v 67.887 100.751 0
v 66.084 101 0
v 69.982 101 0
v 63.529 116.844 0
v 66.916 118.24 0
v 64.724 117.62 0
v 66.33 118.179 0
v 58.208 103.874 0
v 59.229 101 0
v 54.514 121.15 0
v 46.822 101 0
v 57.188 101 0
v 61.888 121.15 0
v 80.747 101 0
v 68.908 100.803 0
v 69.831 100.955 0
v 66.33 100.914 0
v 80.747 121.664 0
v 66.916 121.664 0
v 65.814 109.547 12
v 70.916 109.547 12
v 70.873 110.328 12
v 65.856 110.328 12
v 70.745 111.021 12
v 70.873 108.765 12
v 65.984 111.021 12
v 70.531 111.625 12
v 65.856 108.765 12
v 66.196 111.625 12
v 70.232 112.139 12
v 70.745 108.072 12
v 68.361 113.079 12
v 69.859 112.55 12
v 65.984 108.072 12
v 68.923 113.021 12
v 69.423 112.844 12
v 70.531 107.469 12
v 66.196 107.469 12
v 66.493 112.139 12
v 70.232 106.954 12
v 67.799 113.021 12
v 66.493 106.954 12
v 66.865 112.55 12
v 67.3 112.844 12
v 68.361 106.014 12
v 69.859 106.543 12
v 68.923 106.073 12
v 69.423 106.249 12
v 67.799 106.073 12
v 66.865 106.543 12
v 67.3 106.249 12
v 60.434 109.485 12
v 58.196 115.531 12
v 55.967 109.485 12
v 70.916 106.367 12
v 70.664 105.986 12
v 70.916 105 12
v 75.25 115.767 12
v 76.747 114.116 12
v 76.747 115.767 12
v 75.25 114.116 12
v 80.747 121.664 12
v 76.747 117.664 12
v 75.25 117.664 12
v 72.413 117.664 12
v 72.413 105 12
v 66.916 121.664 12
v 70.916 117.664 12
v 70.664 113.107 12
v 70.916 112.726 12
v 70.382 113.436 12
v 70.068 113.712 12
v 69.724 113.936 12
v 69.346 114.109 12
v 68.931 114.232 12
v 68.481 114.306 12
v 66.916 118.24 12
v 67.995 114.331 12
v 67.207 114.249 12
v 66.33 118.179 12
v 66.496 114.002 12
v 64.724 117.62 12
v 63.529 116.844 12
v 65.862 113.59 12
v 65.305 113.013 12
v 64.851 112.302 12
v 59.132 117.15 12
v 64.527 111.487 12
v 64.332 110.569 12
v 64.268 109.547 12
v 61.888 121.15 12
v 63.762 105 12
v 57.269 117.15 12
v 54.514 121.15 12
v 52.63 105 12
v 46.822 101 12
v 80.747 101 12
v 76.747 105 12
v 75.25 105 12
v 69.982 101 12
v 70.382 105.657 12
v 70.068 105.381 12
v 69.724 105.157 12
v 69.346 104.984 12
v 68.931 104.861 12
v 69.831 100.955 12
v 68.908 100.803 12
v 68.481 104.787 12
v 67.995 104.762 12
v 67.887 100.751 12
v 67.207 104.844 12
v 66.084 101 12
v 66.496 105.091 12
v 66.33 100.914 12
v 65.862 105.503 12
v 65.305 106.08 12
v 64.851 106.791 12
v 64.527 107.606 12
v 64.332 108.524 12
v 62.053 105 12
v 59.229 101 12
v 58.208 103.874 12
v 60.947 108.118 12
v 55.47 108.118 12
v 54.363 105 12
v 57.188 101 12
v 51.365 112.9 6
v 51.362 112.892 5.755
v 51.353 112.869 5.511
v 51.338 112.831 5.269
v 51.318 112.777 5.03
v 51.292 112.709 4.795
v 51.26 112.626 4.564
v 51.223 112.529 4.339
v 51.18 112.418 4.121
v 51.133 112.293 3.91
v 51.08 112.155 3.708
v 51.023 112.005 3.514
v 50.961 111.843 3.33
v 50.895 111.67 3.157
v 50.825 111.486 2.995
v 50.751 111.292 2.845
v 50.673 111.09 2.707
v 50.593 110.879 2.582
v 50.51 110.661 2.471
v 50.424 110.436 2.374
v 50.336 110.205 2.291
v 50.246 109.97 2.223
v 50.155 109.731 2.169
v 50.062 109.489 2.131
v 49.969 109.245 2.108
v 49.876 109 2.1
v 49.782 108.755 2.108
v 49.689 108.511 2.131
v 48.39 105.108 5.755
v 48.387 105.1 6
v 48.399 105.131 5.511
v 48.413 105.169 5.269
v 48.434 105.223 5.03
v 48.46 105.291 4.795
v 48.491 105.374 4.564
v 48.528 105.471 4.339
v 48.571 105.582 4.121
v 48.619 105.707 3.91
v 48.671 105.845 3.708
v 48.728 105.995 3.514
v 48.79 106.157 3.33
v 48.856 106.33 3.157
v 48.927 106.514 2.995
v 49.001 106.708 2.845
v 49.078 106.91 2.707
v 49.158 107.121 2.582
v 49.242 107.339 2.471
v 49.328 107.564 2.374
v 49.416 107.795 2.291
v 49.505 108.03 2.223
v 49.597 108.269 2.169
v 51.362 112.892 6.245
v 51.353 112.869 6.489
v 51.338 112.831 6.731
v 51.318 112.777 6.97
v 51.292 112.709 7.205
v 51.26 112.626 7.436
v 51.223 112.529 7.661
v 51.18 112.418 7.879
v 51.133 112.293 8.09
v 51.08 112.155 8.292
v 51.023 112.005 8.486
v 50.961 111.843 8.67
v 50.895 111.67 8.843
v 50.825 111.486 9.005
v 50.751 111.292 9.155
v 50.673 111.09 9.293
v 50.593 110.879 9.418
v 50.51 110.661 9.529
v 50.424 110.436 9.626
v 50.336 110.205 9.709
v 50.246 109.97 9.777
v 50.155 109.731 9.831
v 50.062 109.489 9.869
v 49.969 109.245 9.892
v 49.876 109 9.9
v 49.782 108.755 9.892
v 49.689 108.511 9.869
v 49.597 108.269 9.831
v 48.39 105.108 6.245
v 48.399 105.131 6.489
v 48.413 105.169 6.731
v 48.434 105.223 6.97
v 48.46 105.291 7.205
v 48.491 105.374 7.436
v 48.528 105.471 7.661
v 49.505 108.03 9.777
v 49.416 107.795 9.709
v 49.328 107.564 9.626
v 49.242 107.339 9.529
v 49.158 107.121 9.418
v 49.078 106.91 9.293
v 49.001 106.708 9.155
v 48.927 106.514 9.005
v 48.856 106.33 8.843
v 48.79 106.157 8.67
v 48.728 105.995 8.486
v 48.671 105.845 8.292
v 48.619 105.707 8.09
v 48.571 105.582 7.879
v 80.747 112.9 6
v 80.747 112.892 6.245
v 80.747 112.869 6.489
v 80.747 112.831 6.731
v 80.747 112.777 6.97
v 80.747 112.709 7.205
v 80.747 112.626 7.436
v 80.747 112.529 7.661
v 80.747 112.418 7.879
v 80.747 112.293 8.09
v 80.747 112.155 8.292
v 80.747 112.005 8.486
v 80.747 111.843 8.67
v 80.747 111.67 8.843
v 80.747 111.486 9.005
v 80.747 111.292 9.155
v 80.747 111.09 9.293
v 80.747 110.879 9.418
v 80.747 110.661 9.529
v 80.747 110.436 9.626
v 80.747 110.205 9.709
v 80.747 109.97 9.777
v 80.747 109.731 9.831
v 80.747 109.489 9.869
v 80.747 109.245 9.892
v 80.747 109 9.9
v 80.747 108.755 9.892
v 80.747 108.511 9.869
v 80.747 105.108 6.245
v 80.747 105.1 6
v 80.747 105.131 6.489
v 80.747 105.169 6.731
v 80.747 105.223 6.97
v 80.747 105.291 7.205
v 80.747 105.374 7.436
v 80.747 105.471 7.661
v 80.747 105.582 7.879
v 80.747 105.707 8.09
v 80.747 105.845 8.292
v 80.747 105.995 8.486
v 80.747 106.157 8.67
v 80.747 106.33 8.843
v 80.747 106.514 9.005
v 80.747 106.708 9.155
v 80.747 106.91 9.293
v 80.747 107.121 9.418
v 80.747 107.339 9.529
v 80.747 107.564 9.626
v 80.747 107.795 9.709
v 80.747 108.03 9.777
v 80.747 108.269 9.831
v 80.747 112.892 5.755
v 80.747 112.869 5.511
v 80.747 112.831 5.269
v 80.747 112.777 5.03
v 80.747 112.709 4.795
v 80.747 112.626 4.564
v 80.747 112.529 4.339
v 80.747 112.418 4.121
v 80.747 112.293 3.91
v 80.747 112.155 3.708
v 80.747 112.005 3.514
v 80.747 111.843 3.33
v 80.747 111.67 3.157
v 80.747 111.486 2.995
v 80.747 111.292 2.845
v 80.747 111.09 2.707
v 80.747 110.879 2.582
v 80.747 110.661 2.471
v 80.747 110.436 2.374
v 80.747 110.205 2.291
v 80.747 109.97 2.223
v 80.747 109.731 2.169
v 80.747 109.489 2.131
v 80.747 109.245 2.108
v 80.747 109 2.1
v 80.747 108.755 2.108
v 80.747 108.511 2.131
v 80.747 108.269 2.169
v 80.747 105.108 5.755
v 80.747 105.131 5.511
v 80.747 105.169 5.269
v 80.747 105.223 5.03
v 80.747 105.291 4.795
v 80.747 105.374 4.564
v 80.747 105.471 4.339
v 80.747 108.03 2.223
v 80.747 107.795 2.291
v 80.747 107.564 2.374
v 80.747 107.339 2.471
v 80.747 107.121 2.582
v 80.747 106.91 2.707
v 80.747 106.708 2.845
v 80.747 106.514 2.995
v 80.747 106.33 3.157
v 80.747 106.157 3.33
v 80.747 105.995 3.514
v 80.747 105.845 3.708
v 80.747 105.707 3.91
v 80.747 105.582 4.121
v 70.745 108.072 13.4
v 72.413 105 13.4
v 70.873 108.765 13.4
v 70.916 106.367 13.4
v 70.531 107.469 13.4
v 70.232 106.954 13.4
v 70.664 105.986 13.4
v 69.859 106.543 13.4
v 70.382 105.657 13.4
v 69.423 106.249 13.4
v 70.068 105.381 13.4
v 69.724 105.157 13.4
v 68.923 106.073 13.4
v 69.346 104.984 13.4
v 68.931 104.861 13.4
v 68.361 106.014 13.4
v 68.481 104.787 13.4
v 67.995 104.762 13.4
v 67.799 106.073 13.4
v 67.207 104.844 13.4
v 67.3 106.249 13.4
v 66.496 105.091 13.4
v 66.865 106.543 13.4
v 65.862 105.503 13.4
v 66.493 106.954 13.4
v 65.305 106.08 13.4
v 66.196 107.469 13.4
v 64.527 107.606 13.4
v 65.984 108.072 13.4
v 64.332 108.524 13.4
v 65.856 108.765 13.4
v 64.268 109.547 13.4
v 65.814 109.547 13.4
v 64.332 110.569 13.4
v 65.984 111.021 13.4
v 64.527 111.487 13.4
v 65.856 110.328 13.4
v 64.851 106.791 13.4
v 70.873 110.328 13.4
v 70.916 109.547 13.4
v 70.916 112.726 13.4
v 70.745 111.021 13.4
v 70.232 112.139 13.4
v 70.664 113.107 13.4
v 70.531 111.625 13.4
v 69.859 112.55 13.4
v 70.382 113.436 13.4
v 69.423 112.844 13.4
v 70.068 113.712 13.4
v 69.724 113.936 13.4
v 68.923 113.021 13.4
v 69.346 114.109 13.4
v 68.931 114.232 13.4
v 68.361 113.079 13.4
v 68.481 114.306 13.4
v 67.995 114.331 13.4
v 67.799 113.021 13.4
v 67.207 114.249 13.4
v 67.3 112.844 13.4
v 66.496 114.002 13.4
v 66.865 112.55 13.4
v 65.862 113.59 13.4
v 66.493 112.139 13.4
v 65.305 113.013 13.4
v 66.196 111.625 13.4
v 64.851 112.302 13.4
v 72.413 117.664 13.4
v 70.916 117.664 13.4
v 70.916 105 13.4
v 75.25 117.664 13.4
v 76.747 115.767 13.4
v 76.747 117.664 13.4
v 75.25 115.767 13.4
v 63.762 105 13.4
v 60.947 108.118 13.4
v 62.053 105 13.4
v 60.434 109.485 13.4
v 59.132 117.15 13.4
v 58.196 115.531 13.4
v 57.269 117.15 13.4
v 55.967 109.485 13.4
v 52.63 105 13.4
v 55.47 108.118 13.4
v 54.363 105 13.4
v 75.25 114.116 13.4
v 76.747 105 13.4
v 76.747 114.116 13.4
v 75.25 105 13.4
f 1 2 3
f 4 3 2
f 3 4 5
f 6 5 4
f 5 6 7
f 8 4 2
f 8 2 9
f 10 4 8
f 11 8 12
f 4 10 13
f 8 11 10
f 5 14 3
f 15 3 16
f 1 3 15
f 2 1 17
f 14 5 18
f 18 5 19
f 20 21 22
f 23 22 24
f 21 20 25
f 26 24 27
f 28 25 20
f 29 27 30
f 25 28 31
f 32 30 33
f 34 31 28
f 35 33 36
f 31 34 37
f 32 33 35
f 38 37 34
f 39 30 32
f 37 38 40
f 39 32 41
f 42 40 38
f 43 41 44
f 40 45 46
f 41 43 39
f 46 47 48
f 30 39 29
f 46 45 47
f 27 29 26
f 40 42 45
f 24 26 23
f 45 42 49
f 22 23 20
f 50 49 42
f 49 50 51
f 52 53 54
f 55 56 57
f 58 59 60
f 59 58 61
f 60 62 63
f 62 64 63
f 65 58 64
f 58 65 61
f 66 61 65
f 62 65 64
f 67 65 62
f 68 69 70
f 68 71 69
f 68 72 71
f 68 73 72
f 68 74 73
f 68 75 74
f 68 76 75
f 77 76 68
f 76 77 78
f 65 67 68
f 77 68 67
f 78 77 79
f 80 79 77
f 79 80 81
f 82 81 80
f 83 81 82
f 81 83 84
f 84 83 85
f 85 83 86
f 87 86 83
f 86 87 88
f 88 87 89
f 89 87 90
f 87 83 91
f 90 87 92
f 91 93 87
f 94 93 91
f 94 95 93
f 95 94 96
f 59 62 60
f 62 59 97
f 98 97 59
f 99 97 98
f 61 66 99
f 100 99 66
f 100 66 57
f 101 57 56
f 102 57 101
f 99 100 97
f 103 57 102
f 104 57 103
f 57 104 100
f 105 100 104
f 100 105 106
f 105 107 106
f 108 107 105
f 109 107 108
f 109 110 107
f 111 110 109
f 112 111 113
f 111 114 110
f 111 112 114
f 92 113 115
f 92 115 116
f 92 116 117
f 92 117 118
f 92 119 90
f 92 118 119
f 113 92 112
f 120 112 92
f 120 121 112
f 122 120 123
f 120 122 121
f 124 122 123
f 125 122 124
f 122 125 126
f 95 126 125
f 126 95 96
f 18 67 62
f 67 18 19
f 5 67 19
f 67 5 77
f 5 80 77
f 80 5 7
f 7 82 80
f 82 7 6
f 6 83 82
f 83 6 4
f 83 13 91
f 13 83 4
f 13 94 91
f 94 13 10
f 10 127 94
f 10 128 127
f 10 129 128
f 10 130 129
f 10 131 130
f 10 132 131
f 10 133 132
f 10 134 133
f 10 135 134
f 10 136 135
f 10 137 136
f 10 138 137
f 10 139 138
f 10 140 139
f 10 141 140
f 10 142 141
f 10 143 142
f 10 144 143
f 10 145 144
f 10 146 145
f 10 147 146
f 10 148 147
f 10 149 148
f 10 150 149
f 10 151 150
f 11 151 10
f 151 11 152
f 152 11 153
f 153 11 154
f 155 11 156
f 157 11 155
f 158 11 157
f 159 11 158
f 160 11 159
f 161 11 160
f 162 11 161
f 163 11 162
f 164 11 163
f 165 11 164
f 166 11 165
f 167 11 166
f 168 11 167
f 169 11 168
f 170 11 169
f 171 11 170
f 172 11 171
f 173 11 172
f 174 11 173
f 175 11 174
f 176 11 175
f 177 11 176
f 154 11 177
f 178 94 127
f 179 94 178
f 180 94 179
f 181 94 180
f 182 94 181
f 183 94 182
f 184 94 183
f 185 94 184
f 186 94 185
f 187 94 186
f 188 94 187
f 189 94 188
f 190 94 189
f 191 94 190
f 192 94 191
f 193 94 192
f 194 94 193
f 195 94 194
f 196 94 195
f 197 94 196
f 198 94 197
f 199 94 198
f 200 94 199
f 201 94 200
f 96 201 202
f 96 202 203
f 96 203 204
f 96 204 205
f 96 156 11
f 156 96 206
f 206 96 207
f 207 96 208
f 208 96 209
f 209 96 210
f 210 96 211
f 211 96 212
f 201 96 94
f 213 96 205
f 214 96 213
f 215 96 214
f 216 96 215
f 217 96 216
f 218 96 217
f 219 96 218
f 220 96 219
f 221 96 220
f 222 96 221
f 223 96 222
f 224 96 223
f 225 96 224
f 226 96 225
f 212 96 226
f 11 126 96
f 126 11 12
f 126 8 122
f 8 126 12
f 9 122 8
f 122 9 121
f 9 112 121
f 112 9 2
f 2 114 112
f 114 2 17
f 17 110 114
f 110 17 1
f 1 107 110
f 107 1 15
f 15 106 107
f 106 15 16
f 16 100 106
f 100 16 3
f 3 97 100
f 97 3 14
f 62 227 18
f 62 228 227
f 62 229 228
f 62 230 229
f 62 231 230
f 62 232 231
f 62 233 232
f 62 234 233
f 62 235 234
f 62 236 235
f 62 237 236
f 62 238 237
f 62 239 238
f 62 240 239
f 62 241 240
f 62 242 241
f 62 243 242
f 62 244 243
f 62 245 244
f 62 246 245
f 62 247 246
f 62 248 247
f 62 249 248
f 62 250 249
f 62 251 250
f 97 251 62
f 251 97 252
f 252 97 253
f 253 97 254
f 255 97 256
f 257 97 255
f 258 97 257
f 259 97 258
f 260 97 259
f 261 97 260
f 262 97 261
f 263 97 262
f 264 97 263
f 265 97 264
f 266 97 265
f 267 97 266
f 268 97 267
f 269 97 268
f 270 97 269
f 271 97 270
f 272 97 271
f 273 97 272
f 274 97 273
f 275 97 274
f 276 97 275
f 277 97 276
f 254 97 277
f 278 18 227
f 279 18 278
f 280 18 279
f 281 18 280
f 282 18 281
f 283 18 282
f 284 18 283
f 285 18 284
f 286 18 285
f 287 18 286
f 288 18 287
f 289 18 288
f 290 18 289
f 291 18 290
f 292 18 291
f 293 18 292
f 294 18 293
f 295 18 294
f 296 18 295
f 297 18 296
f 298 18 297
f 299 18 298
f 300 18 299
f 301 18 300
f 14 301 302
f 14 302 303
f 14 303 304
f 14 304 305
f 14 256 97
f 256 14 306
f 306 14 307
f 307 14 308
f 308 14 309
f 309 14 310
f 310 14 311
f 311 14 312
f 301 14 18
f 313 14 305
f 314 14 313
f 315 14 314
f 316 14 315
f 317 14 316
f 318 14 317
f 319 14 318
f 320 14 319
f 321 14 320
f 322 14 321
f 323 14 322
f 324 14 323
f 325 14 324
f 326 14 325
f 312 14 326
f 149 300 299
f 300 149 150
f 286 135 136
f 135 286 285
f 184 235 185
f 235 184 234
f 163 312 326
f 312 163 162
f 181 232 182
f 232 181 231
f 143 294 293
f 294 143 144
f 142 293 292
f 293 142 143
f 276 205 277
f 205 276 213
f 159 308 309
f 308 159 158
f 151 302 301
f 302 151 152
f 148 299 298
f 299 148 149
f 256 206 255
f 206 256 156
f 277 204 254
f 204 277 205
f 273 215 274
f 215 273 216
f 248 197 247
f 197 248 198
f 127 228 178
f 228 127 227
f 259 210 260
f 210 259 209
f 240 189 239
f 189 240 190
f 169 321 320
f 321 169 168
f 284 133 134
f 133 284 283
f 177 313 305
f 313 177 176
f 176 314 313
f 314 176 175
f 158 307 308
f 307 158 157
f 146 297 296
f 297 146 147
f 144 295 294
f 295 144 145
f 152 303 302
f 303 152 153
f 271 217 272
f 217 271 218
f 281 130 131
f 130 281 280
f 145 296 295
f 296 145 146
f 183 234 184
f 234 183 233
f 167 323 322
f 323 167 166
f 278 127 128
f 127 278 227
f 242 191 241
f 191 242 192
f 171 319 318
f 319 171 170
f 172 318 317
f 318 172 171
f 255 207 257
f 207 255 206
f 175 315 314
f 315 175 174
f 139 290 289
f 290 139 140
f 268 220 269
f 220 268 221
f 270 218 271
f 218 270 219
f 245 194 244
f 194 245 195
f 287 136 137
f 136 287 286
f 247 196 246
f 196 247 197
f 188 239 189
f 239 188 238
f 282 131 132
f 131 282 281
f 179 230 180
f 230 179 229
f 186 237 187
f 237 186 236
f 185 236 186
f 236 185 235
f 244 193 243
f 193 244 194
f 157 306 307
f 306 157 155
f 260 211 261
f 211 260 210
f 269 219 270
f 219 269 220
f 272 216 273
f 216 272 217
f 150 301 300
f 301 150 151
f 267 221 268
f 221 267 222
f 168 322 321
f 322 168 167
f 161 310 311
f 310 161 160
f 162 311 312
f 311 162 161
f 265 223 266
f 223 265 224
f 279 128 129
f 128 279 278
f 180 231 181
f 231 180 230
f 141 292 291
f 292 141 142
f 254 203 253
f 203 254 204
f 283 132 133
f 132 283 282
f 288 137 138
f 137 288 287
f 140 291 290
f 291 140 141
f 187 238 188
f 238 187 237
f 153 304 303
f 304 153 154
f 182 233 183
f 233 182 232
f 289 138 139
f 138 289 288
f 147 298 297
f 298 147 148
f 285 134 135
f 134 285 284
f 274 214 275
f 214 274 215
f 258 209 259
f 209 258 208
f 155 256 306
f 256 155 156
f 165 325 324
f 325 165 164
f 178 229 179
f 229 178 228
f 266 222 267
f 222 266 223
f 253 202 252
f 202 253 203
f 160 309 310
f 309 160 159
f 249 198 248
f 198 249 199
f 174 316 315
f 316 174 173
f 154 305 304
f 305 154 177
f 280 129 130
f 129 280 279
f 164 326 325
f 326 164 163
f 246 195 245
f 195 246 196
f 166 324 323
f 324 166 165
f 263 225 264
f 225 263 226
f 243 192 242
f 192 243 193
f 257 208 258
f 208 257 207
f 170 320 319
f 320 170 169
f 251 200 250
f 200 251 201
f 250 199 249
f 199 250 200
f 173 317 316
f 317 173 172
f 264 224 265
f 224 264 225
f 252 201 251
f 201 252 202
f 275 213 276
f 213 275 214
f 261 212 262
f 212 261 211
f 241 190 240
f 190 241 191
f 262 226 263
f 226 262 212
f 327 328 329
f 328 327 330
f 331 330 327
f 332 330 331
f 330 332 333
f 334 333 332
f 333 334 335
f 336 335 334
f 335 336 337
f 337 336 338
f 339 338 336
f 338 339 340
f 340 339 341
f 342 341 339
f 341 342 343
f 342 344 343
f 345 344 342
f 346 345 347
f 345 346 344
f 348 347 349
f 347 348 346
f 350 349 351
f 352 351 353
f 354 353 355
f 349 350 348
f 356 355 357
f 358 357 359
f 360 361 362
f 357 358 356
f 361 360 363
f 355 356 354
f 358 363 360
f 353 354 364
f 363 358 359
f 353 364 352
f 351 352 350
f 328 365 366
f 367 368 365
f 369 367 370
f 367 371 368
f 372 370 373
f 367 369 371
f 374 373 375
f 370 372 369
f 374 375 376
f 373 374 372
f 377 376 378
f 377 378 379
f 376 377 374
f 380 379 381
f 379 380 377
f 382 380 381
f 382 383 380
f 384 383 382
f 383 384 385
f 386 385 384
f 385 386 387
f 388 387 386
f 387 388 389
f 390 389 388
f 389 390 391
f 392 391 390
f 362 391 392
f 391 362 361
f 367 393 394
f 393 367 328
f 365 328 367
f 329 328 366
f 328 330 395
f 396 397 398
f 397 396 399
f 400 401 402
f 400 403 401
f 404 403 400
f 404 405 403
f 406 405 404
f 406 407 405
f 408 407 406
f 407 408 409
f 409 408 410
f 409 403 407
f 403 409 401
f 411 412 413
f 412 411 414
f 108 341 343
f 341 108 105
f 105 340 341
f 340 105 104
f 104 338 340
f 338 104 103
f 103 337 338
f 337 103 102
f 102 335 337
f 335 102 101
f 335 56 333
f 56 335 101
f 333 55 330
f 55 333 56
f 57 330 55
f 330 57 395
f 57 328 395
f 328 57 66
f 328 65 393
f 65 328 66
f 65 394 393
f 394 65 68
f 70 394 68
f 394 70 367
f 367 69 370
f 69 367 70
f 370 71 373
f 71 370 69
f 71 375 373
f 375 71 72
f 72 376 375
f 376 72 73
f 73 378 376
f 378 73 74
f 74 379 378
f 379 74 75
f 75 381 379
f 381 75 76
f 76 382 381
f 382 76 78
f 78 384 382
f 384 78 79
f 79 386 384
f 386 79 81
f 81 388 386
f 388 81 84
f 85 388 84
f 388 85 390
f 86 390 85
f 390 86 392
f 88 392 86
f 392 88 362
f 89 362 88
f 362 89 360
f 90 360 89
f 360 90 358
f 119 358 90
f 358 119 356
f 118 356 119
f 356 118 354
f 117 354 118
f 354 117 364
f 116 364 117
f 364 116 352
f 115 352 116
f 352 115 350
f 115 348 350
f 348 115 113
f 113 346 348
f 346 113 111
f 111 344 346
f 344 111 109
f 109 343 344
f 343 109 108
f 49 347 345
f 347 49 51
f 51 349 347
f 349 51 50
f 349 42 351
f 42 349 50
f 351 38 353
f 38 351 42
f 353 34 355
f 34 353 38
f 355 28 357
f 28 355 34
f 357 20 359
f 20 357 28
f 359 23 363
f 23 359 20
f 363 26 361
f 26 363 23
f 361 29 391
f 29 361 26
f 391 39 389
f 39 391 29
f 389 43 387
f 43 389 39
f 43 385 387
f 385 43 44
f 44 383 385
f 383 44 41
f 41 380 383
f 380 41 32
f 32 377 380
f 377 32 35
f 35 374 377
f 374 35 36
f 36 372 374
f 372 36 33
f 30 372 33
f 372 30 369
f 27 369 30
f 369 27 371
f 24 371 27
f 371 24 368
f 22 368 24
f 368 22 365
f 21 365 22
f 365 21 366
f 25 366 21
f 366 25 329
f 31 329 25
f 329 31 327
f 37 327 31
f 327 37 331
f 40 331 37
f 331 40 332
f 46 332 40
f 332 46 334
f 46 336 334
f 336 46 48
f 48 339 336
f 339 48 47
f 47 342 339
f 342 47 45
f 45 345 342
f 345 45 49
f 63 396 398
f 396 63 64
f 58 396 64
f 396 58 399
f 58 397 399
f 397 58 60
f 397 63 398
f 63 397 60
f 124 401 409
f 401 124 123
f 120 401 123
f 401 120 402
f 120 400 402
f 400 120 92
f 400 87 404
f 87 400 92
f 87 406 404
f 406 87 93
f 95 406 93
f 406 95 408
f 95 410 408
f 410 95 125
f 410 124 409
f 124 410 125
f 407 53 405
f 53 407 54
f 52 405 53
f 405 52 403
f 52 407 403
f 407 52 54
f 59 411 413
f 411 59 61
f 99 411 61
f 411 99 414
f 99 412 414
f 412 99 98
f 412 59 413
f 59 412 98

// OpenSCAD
/* =====================================================
   Multi-Name Topper
   ===================================================== */

grid_cols = 2;
/* [Nama] */
nama_1  = "Adi";
nama_1_icon = "None"; // ["None", "Anchor", "Heart", "Star", "Crown", "Paw", "Music", "Cat", "Moon", "Sun", "Flower", "Diamond", "Butterfly", "Ribbon", "Smile"]

nama_2  = "";
nama_2_icon = "None"; // ["None", "Anchor", "Heart", "Star", "Crown", "Paw", "Music", "Cat", "Moon", "Sun", "Flower", "Diamond", "Butterfly", "Ribbon", "Smile"]

nama_3  = "";
nama_3_icon = "None"; // ["None", "Anchor", "Heart", "Star", "Crown", "Paw", "Music", "Cat", "Moon", "Sun", "Flower", "Diamond", "Butterfly", "Ribbon", "Smile"]

nama_4  = "";
nama_4_icon = "None"; // ["None", "Anchor", "Heart", "Star", "Crown", "Paw", "Music", "Cat", "Moon", "Sun", "Flower", "Diamond", "Butterfly", "Ribbon", "Smile"]

nama_5  = "";
nama_5_icon = "None"; // ["None", "Anchor", "Heart", "Star", "Crown", "Paw", "Music", "Cat", "Moon", "Sun", "Flower", "Diamond", "Butterfly", "Ribbon", "Smile"]

nama_6  = "";
nama_6_icon = "None"; // ["None", "Anchor", "Heart", "Star", "Crown", "Paw", "Music", "Cat", "Moon", "Sun", "Flower", "Diamond", "Butterfly", "Ribbon", "Smile"]

nama_7  = "";
nama_7_icon = "None"; // ["None", "Anchor", "Heart", "Star", "Crown", "Paw", "Music", "Cat", "Moon", "Sun", "Flower", "Diamond", "Butterfly", "Ribbon", "Smile"]

nama_8  = "";
nama_8_icon = "None"; // ["None", "Anchor", "Heart", "Star", "Crown", "Paw", "Music", "Cat", "Moon", "Sun", "Flower", "Diamond", "Butterfly", "Ribbon", "Smile"]

nama_9  = "";
nama_9_icon = "None"; // ["None", "Anchor", "Heart", "Star", "Crown", "Paw", "Music", "Cat", "Moon", "Sun", "Flower", "Diamond", "Butterfly", "Ribbon", "Smile"]

nama_10 = "";
nama_10_icon = "None"; // ["None", "Anchor", "Heart", "Star", "Crown", "Paw", "Music", "Cat", "Moon", "Sun", "Flower", "Diamond", "Butterfly", "Ribbon", "Smile"]

/* [Warna] */
base_color_name    = "Peak Green"; // [Yellow, White, Sky Blue, Red, Peak Green, Orange, Grape Purple, Black, Beige, Barbie Pink]
letters_color_name = "White";      // [Yellow, White, Sky Blue, Red, Peak Green, Orange, Grape Purple, Black, Beige, Barbie Pink]

/* [Settings] */
font_name        = "Bagel Fat One"; // font [Bagel Fat One, Chewy, Courgette, Dancing Script, Lemon, Lobster, Pacifico, Playfair, Lily Script One, Sacramento, Bubblegum Sans, DynaPuff, Alkatra, Archivo, Sour Gummy, Shrikhand]
letter_height    = 12;
letter_thickness = 1.4;
base_height      = 12;
outline_margin   = 4;
hole_orientation = "FRONTBACK"; // ["FRONTBACK", "TOPBOTTOM"]
hole_diameter    = 7.8;
hole_length      = 200;
hole_x           = 21;
hole_y           = 4;
hole_z           = base_height / 2;

/* [Layout Grid] */
bed_x = 235;
bed_y = 235;

gap_x = 10;
gap_y = 10;

slot_w = 60;
slot_h = 25;

/* [Direction/Alignment] */
rtl         = false;
text_halign = rtl ? "right" : "left";

/* ===============================
   COLOR MAPPING (NAME → HEX)
   =============================== */
function getColor(name) =
    name == "Yellow"       ? "#FFD700" :
    name == "White"        ? "#FFFFFF" :
    name == "Sky Blue"     ? "#87CEEB" :
    name == "Red"          ? "#FF0000" :
    name == "Peak Green"   ? "#00C853" :
    name == "Orange"       ? "#FF6A00" :
    name == "Grape Purple" ? "#6A0DAD" :
    name == "Black"        ? "#000000" :
    name == "Beige"        ? "#D9B99b" :
    name == "Barbie Pink"  ? "#FF69B4" :
    "#FFFFFF";

base_color    = getColor(base_color_name);
letters_color = getColor(letters_color_name);

// ─────────────────────────────────────────────
// VECTOR 2D ICONS (100% CGAL Safe untuk MakerWorld)
// ─────────────────────────────────────────────
module icon_anchor(h = 10) {
    s = h / 12;
    scale([s, s]) {
        translate([0, 1]) {
            difference() {
                translate([0, 9.5]) circle(r = 2.2, $fn=24);
                translate([0, 9.5]) circle(r = 1.0, $fn=24);
            }
            translate([-0.8, 1]) square([1.6, 7.5]);
            translate([-3, 6]) square([6, 1.3]);
            difference() {
                translate([0, 3.5]) circle(r = 4.5, $fn=24);
                translate([0, 3.5]) circle(r = 2.9, $fn=24);
                translate([-6, 3.5]) square([12, 6]);
            }
            hull() {
                translate([-4.5, 3.5]) circle(r = 0.8, $fn=16);
                translate([-5.5, 5.2]) circle(r = 0.3, $fn=16);
                translate([-3.2, 3.5]) circle(r = 0.8, $fn=16);
            }
            hull() {
                translate([4.5, 3.5]) circle(r = 0.8, $fn=16);
                translate([5.5, 5.2]) circle(r = 0.3, $fn=16);
                translate([3.2, 3.5]) circle(r = 0.8, $fn=16);
            }
        }
    }
}

module icon_heart(h = 10) {
    s = h / 9.5;
    scale([s, s]) {
        translate([0, 0.5]) {
            hull() {
                translate([-2.5, 6.5]) circle(r = 2.5, $fn=24);
                translate([0, 1.2]) circle(r = 0.6, $fn=16);
            }
            hull() {
                translate([2.5, 6.5]) circle(r = 2.5, $fn=24);
                translate([0, 1.2]) circle(r = 0.6, $fn=16);
            }
        }
    }
}

module icon_star(h = 10) {
    r_out = h / 2;
    r_in  = r_out * 0.42;
    translate([0, r_out]) {
        for (i = [0:4]) {
            hull() {
                circle(r = r_in, $fn=16);
                rotate([0, 0, i * 72 + 90]) translate([r_out, 0]) circle(r = 0.5, $fn=12);
            }
        }
    }
}

module icon_crown(h = 10) {
    s = h / 10;
    scale([s, s]) {
        translate([0, 0.5]) {
            hull() {
                translate([-4.5, 0]) square([9, 1.5]);
                translate([0, 7.5]) circle(r = 0.8, $fn=16);
            }
            hull() {
                translate([-4.5, 0]) square([9, 1.5]);
                translate([-4.2, 6.5]) circle(r = 0.8, $fn=16);
            }
            hull() {
                translate([-4.5, 0]) square([9, 1.5]);
                translate([4.2, 6.5]) circle(r = 0.8, $fn=16);
            }
        }
    }
}

module icon_paw(h = 10) {
    s = h / 12;
    scale([s, s]) {
        translate([0, 1]) {
            hull() {
                translate([0, 3.5]) circle(r = 2.8, $fn=24);
                translate([-2, 2]) circle(r = 1.6, $fn=20);
                translate([2, 2]) circle(r = 1.6, $fn=20);
            }
            translate([-3.3, 7.5]) circle(r = 1.0, $fn=16);
            translate([-1.3, 9.2]) circle(r = 1.1, $fn=16);
            translate([1.3, 9.2]) circle(r = 1.1, $fn=16);
            translate([3.3, 7.5]) circle(r = 1.0, $fn=16);
        }
    }
}

module icon_music(h = 10) {
    s = h / 12;
    scale([s, s]) {
        translate([0, 1]) {
            rotate([0, 0, -20]) translate([-2.5, 2]) scale([1.3, 0.9]) circle(r = 1.6, $fn=20);
            rotate([0, 0, -20]) translate([1.8, 4]) scale([1.3, 0.9]) circle(r = 1.6, $fn=20);
            translate([-1.5, 2]) square([1.0, 7.5]);
            translate([2.8, 4]) square([1.0, 7.5]);
            hull() {
                translate([-1.5, 8.5]) square([5.3, 1.2]);
                translate([-1.5, 7.5]) square([5.3, 0.5]);
            }
        }
    }
}

module icon_cat(h = 10) {
    s = h / 12;
    scale([s, s]) {
        translate([0, 1]) {
            translate([0, 4.5]) circle(r = 3.8, $fn=24);
            hull() {
                translate([-3.2, 6]) circle(r = 1.0, $fn=16);
                translate([-3.5, 9.2]) circle(r = 0.3, $fn=12);
                translate([-1.2, 7.2]) circle(r = 0.8, $fn=16);
            }
            hull() {
                translate([3.2, 6]) circle(r = 1.0, $fn=16);
                translate([3.5, 9.2]) circle(r = 0.3, $fn=12);
                translate([1.2, 7.2]) circle(r = 0.8, $fn=16);
            }
        }
    }
}

module icon_moon(h = 10) {
    s = h / 12;
    scale([s, s]) {
        translate([0, 1]) {
            difference() {
                translate([0, 5]) circle(r = 4.5, $fn=32);
                translate([2.2, 5.5]) circle(r = 4.0, $fn=32);
            }
        }
    }
}

module icon_sun(h = 10) {
    s = h / 12;
    scale([s, s]) {
        translate([0, 6]) {
            circle(r = 2.5, $fn=24);
            for (a = [0:45:315]) {
                rotate([0, 0, a])
                    hull() {
                        translate([3.2, 0]) circle(r = 0.5, $fn=12);
                        translate([4.6, 0]) circle(r = 0.2, $fn=8);
                    }
            }
        }
    }
}

module icon_flower(h = 10) {
    s = h / 12;
    scale([s, s]) {
        translate([0, 6]) {
            circle(r = 1.5, $fn=20);
            for (a = [0:72:288]) {
                rotate([0, 0, a])
                    translate([2.5, 0]) circle(r = 1.6, $fn=20);
            }
        }
    }
}

module icon_diamond(h = 10) {
    s = h / 12;
    scale([s, s]) {
        translate([0, 1]) {
            hull() {
                translate([-4, 6]) square([8, 2]);
                translate([0, 0.5]) circle(r = 0.5, $fn=16);
            }
            hull() {
                translate([-4, 6]) square([8, 2]);
                translate([-2.5, 9.5]) square([5, 0.5]);
            }
        }
    }
}

module icon_butterfly(h = 10) {
    s = h / 12;
    scale([s, s]) {
        translate([0, 1]) {
            hull() {
                translate([0, 7]) circle(r = 0.8, $fn=16);
                translate([0, 2]) circle(r = 0.5, $fn=16);
            }
            hull() {
                translate([-2.8, 6.8]) circle(r = 2.2, $fn=20);
                translate([0, 5]) circle(r = 0.8, $fn=16);
            }
            hull() {
                translate([2.8, 6.8]) circle(r = 2.2, $fn=20);
                translate([0, 5]) circle(r = 0.8, $fn=16);
            }
            hull() {
                translate([-2.2, 3.2]) circle(r = 1.6, $fn=20);
                translate([0, 4]) circle(r = 0.6, $fn=16);
            }
            hull() {
                translate([2.2, 3.2]) circle(r = 1.6, $fn=20);
                translate([0, 4]) circle(r = 0.6, $fn=16);
            }
        }
    }
}

module icon_ribbon(h = 10) {
    s = h / 12;
    scale([s, s]) {
        translate([0, 1]) {
            translate([0, 5.5]) circle(r = 1.2, $fn=20);
            hull() {
                translate([0, 5.5]) circle(r = 0.8, $fn=16);
                translate([-3.8, 6.8]) circle(r = 1.8, $fn=20);
                translate([-3.8, 4.2]) circle(r = 1.6, $fn=20);
            }
            hull() {
                translate([0, 5.5]) circle(r = 0.8, $fn=16);
                translate([3.8, 6.8]) circle(r = 1.8, $fn=20);
                translate([3.8, 4.2]) circle(r = 1.6, $fn=20);
            }
            hull() {
                translate([0, 5]) circle(r = 0.6, $fn=12);
                translate([-2.8, 1.2]) circle(r = 0.6, $fn=12);
            }
            hull() {
                translate([0, 5]) circle(r = 0.6, $fn=12);
                translate([2.8, 1.2]) circle(r = 0.6, $fn=12);
            }
        }
    }
}

module icon_smile(h = 10) {
    s = h / 12;
    scale([s, s]) {
        translate([0, 1]) {
            difference() {
                translate([0, 5]) circle(r = 4.5, $fn=32);
                translate([0, 5]) circle(r = 3.2, $fn=32);
            }
            translate([-1.8, 6.2]) circle(r = 0.7, $fn=16);
            translate([1.8, 6.2]) circle(r = 0.7, $fn=16);
            difference() {
                translate([0, 4.8]) circle(r = 2.2, $fn=24);
                translate([0, 4.8]) circle(r = 1.4, $fn=24);
                translate([-3, 4.8]) square([6, 3]);
            }
        }
    }
}

module draw_icon(name, size = 10) {
    if (name == "Anchor") {
        translate([size * 0.4, 0, 0]) icon_anchor(size);
    } else if (name == "Heart") {
        translate([size * 0.44, 0, 0]) icon_heart(size);
    } else if (name == "Star") {
        translate([size * 0.4, 0, 0]) icon_star(size);
    } else if (name == "Crown") {
        translate([size * 0.4, 0, 0]) icon_crown(size);
    } else if (name == "Paw") {
        translate([size * 0.4, 0, 0]) icon_paw(size);
    } else if (name == "Music") {
        translate([size * 0.4, 0, 0]) icon_music(size);
    } else if (name == "Cat") {
        translate([size * 0.4, 0, 0]) icon_cat(size);
    } else if (name == "Moon") {
        translate([size * 0.4, 0, 0]) icon_moon(size);
    } else if (name == "Sun") {
        translate([size * 0.4, 0, 0]) icon_sun(size);
    } else if (name == "Flower") {
        translate([size * 0.4, 0, 0]) icon_flower(size);
    } else if (name == "Diamond") {
        translate([size * 0.4, 0, 0]) icon_diamond(size);
    } else if (name == "Butterfly") {
        translate([size * 0.4, 0, 0]) icon_butterfly(size);
    } else if (name == "Ribbon") {
        translate([size * 0.4, 0, 0]) icon_ribbon(size);
    } else if (name == "Smile") {
        translate([size * 0.4, 0, 0]) icon_smile(size);
    }
}

// ─────────────────────────────────────────────
// EMOJI CLEANER & AUTO DETECT
// ─────────────────────────────────────────────
function is_printable_ascii(c) = (ord(c) >= 32 && ord(c) <= 126) || ord(c) == 194 || ord(c) == 176 || ord(c) == 177;

function str_join(arr, idx=0) = 
    idx >= len(arr) ? "" :
    str(arr[idx], str_join(arr, idx+1));

function clean_text(str_val) = 
    len(str_val) == 0 ? "" :
    str_join([for (i = [0:len(str_val)-1]) if (is_printable_ascii(str_val[i])) str_val[i]]);

function has_emoji_or_symbol(str_val) =
    len(str_val) == 0 ? false :
    len([for (i = [0:len(str_val)-1]) if (!is_printable_ascii(str_val[i])) 1]) > 0;

function resolve_icon(word, select_icon) =
    select_icon != "None" ? select_icon :
    has_emoji_or_symbol(word) ? "Anchor" :
    "None";

function char_w_val(c) =
    c=="A" ? 0.96 : c=="B" ? 0.80 : c=="C" ? 0.84 :
    c=="D" ? 0.84 : c=="E" ? 0.86 : c=="F" ? 0.76 :
    c=="G" ? 0.96 : c=="H" ? 0.93 : c=="I" ? 0.4  :
    c=="J" ? 0.76 : c=="K" ? 0.92 : c=="L" ? 0.74 :
    c=="M" ? 1.20 : c=="N" ? 0.98 : c=="O" ? 0.90 :
    c=="P" ? 0.88 : c=="Q" ? 0.90 : c=="R" ? 0.92 :
    c=="S" ? 0.90 : c=="T" ? 0.74 : c=="U" ? 0.86 :
    c=="V" ? 0.84 : c=="W" ? 1.14 : c=="X" ? 0.80 :
    c=="Y" ? 0.78 : c=="Z" ? 0.78 :
    c=="a" ? 0.85 : c=="b" ? 0.79 : c=="c" ? 0.74 :
    c=="d" ? 0.84 : c=="e" ? 0.76 : c=="f" ? 0.54 :
    c=="g" ? 0.76 : c=="h" ? 0.78 : c=="i" ? 0.38 :
    c=="j" ? 0.44 : c=="k" ? 0.84 : c=="l" ? 0.38 :
    c=="m" ? 1.08 : c=="n" ? 0.78 : c=="o" ? 0.78 :
    c=="p" ? 0.76 : c=="q" ? 0.86 : c=="r" ? 0.70 :
    c=="s" ? 0.76 : c=="t" ? 0.70 : c=="u" ? 0.84 :
    c=="v" ? 0.74 : c=="w" ? 1.14 : c=="x" ? 0.70 :
    c=="y" ? 0.74 : c=="z" ? 0.80 :
    c=="." ? 0.10 : ord(c)==194 ? 0.18 : ord(c)==176 ? 0.18 :
    c==" " ? 0.50 : 0.76;

function sum_char_w(str_val, idx=0) =
    idx >= len(str_val) ? 0 :
    char_w_val(str_val[idx]) + sum_char_w(str_val, idx+1);

function get_raw_word_width(word) =
    let(cleaned = clean_text(word))
    sum_char_w(cleaned) * letter_height;

module render_text_and_icon(text_string, icon_name = "None") {
    effective_icon = resolve_icon(text_string, icon_name);
    cleaned = clean_text(text_string);
    word_w  = get_raw_word_width(text_string);

    if (cleaned != "") {
        text(
            cleaned,
            size   = letter_height,
            font   = font_name,
            halign = text_halign,
            valign = "baseline"
        );
    }
    if (effective_icon != "None") {
        translate([word_w, 0, 0])
            draw_icon(effective_icon, size = letter_height * 0.9);
    }
}

/* ===============================
   MODULES (ASLI)
   =============================== */
module base_with_tunnel(text_string, icon_name = "None") {
    difference() {
        linear_extrude(height = base_height)
            offset(delta = outline_margin)
                render_text_and_icon(text_string, icon_name);

        if (hole_orientation == "FRONTBACK") {
            translate([ 0, hole_y, hole_z ])
                rotate([ 0, 90, 0 ])
                    cylinder(d = hole_diameter, h = hole_length, center = true, $fn = 100);
        }
        else if (hole_orientation == "TOPBOTTOM") {
            translate([ hole_x, 0, hole_z ])
                rotate([ 90, 0, 0 ])
                    cylinder(d = hole_diameter, h = hole_length, center = true, $fn = 100);
        }
        else {
            echo("Error: hole_orientation must be \"FRONTBACK\" or \"TOPBOTTOM\".");
        }
    }
}

module raised_letters(text_string, icon_name = "None") {
    translate([ 0, 0, base_height ])
        linear_extrude(height = letter_thickness)
            render_text_and_icon(text_string, icon_name);
}

module name_topper(text_string, icon_name = "None") {
    color(base_color)    base_with_tunnel(text_string, icon_name);
    color(letters_color) raised_letters(text_string, icon_name);
}

/* ===============================
   GENERATE — grid layout, center di bed
   =============================== */
nama_all = [
    nama_1, nama_2, nama_3, nama_4, nama_5,
    nama_6, nama_7, nama_8, nama_9, nama_10
];

icon_all = [
    nama_1_icon, nama_2_icon, nama_3_icon, nama_4_icon, nama_5_icon,
    nama_6_icon, nama_7_icon, nama_8_icon, nama_9_icon, nama_10_icon
];

active_indices = [for (i = [0:9]) if (nama_all[i] != "") i];
total          = len(active_indices);

grid_rows = ceil(total / grid_cols);

total_w = grid_cols * slot_w + (grid_cols - 1) * gap_x;
total_h = grid_rows * slot_h + (grid_rows - 1) * gap_y;

start_x = (bed_x - total_w) / 2;
start_y = (bed_y - total_h) / 2;

if (total > 0) {
    for (idx = [0 : total - 1]) {
        i   = active_indices[idx];
        col = idx % grid_cols;
        row = floor(idx / grid_cols);

        x = start_x + col * (slot_w + gap_x);
        y = start_y + (grid_rows - 1 - row) * (slot_h + gap_y);

        translate([ x, y, 0 ])
            name_topper(nama_all[i], icon_all[i]);
    }
}
